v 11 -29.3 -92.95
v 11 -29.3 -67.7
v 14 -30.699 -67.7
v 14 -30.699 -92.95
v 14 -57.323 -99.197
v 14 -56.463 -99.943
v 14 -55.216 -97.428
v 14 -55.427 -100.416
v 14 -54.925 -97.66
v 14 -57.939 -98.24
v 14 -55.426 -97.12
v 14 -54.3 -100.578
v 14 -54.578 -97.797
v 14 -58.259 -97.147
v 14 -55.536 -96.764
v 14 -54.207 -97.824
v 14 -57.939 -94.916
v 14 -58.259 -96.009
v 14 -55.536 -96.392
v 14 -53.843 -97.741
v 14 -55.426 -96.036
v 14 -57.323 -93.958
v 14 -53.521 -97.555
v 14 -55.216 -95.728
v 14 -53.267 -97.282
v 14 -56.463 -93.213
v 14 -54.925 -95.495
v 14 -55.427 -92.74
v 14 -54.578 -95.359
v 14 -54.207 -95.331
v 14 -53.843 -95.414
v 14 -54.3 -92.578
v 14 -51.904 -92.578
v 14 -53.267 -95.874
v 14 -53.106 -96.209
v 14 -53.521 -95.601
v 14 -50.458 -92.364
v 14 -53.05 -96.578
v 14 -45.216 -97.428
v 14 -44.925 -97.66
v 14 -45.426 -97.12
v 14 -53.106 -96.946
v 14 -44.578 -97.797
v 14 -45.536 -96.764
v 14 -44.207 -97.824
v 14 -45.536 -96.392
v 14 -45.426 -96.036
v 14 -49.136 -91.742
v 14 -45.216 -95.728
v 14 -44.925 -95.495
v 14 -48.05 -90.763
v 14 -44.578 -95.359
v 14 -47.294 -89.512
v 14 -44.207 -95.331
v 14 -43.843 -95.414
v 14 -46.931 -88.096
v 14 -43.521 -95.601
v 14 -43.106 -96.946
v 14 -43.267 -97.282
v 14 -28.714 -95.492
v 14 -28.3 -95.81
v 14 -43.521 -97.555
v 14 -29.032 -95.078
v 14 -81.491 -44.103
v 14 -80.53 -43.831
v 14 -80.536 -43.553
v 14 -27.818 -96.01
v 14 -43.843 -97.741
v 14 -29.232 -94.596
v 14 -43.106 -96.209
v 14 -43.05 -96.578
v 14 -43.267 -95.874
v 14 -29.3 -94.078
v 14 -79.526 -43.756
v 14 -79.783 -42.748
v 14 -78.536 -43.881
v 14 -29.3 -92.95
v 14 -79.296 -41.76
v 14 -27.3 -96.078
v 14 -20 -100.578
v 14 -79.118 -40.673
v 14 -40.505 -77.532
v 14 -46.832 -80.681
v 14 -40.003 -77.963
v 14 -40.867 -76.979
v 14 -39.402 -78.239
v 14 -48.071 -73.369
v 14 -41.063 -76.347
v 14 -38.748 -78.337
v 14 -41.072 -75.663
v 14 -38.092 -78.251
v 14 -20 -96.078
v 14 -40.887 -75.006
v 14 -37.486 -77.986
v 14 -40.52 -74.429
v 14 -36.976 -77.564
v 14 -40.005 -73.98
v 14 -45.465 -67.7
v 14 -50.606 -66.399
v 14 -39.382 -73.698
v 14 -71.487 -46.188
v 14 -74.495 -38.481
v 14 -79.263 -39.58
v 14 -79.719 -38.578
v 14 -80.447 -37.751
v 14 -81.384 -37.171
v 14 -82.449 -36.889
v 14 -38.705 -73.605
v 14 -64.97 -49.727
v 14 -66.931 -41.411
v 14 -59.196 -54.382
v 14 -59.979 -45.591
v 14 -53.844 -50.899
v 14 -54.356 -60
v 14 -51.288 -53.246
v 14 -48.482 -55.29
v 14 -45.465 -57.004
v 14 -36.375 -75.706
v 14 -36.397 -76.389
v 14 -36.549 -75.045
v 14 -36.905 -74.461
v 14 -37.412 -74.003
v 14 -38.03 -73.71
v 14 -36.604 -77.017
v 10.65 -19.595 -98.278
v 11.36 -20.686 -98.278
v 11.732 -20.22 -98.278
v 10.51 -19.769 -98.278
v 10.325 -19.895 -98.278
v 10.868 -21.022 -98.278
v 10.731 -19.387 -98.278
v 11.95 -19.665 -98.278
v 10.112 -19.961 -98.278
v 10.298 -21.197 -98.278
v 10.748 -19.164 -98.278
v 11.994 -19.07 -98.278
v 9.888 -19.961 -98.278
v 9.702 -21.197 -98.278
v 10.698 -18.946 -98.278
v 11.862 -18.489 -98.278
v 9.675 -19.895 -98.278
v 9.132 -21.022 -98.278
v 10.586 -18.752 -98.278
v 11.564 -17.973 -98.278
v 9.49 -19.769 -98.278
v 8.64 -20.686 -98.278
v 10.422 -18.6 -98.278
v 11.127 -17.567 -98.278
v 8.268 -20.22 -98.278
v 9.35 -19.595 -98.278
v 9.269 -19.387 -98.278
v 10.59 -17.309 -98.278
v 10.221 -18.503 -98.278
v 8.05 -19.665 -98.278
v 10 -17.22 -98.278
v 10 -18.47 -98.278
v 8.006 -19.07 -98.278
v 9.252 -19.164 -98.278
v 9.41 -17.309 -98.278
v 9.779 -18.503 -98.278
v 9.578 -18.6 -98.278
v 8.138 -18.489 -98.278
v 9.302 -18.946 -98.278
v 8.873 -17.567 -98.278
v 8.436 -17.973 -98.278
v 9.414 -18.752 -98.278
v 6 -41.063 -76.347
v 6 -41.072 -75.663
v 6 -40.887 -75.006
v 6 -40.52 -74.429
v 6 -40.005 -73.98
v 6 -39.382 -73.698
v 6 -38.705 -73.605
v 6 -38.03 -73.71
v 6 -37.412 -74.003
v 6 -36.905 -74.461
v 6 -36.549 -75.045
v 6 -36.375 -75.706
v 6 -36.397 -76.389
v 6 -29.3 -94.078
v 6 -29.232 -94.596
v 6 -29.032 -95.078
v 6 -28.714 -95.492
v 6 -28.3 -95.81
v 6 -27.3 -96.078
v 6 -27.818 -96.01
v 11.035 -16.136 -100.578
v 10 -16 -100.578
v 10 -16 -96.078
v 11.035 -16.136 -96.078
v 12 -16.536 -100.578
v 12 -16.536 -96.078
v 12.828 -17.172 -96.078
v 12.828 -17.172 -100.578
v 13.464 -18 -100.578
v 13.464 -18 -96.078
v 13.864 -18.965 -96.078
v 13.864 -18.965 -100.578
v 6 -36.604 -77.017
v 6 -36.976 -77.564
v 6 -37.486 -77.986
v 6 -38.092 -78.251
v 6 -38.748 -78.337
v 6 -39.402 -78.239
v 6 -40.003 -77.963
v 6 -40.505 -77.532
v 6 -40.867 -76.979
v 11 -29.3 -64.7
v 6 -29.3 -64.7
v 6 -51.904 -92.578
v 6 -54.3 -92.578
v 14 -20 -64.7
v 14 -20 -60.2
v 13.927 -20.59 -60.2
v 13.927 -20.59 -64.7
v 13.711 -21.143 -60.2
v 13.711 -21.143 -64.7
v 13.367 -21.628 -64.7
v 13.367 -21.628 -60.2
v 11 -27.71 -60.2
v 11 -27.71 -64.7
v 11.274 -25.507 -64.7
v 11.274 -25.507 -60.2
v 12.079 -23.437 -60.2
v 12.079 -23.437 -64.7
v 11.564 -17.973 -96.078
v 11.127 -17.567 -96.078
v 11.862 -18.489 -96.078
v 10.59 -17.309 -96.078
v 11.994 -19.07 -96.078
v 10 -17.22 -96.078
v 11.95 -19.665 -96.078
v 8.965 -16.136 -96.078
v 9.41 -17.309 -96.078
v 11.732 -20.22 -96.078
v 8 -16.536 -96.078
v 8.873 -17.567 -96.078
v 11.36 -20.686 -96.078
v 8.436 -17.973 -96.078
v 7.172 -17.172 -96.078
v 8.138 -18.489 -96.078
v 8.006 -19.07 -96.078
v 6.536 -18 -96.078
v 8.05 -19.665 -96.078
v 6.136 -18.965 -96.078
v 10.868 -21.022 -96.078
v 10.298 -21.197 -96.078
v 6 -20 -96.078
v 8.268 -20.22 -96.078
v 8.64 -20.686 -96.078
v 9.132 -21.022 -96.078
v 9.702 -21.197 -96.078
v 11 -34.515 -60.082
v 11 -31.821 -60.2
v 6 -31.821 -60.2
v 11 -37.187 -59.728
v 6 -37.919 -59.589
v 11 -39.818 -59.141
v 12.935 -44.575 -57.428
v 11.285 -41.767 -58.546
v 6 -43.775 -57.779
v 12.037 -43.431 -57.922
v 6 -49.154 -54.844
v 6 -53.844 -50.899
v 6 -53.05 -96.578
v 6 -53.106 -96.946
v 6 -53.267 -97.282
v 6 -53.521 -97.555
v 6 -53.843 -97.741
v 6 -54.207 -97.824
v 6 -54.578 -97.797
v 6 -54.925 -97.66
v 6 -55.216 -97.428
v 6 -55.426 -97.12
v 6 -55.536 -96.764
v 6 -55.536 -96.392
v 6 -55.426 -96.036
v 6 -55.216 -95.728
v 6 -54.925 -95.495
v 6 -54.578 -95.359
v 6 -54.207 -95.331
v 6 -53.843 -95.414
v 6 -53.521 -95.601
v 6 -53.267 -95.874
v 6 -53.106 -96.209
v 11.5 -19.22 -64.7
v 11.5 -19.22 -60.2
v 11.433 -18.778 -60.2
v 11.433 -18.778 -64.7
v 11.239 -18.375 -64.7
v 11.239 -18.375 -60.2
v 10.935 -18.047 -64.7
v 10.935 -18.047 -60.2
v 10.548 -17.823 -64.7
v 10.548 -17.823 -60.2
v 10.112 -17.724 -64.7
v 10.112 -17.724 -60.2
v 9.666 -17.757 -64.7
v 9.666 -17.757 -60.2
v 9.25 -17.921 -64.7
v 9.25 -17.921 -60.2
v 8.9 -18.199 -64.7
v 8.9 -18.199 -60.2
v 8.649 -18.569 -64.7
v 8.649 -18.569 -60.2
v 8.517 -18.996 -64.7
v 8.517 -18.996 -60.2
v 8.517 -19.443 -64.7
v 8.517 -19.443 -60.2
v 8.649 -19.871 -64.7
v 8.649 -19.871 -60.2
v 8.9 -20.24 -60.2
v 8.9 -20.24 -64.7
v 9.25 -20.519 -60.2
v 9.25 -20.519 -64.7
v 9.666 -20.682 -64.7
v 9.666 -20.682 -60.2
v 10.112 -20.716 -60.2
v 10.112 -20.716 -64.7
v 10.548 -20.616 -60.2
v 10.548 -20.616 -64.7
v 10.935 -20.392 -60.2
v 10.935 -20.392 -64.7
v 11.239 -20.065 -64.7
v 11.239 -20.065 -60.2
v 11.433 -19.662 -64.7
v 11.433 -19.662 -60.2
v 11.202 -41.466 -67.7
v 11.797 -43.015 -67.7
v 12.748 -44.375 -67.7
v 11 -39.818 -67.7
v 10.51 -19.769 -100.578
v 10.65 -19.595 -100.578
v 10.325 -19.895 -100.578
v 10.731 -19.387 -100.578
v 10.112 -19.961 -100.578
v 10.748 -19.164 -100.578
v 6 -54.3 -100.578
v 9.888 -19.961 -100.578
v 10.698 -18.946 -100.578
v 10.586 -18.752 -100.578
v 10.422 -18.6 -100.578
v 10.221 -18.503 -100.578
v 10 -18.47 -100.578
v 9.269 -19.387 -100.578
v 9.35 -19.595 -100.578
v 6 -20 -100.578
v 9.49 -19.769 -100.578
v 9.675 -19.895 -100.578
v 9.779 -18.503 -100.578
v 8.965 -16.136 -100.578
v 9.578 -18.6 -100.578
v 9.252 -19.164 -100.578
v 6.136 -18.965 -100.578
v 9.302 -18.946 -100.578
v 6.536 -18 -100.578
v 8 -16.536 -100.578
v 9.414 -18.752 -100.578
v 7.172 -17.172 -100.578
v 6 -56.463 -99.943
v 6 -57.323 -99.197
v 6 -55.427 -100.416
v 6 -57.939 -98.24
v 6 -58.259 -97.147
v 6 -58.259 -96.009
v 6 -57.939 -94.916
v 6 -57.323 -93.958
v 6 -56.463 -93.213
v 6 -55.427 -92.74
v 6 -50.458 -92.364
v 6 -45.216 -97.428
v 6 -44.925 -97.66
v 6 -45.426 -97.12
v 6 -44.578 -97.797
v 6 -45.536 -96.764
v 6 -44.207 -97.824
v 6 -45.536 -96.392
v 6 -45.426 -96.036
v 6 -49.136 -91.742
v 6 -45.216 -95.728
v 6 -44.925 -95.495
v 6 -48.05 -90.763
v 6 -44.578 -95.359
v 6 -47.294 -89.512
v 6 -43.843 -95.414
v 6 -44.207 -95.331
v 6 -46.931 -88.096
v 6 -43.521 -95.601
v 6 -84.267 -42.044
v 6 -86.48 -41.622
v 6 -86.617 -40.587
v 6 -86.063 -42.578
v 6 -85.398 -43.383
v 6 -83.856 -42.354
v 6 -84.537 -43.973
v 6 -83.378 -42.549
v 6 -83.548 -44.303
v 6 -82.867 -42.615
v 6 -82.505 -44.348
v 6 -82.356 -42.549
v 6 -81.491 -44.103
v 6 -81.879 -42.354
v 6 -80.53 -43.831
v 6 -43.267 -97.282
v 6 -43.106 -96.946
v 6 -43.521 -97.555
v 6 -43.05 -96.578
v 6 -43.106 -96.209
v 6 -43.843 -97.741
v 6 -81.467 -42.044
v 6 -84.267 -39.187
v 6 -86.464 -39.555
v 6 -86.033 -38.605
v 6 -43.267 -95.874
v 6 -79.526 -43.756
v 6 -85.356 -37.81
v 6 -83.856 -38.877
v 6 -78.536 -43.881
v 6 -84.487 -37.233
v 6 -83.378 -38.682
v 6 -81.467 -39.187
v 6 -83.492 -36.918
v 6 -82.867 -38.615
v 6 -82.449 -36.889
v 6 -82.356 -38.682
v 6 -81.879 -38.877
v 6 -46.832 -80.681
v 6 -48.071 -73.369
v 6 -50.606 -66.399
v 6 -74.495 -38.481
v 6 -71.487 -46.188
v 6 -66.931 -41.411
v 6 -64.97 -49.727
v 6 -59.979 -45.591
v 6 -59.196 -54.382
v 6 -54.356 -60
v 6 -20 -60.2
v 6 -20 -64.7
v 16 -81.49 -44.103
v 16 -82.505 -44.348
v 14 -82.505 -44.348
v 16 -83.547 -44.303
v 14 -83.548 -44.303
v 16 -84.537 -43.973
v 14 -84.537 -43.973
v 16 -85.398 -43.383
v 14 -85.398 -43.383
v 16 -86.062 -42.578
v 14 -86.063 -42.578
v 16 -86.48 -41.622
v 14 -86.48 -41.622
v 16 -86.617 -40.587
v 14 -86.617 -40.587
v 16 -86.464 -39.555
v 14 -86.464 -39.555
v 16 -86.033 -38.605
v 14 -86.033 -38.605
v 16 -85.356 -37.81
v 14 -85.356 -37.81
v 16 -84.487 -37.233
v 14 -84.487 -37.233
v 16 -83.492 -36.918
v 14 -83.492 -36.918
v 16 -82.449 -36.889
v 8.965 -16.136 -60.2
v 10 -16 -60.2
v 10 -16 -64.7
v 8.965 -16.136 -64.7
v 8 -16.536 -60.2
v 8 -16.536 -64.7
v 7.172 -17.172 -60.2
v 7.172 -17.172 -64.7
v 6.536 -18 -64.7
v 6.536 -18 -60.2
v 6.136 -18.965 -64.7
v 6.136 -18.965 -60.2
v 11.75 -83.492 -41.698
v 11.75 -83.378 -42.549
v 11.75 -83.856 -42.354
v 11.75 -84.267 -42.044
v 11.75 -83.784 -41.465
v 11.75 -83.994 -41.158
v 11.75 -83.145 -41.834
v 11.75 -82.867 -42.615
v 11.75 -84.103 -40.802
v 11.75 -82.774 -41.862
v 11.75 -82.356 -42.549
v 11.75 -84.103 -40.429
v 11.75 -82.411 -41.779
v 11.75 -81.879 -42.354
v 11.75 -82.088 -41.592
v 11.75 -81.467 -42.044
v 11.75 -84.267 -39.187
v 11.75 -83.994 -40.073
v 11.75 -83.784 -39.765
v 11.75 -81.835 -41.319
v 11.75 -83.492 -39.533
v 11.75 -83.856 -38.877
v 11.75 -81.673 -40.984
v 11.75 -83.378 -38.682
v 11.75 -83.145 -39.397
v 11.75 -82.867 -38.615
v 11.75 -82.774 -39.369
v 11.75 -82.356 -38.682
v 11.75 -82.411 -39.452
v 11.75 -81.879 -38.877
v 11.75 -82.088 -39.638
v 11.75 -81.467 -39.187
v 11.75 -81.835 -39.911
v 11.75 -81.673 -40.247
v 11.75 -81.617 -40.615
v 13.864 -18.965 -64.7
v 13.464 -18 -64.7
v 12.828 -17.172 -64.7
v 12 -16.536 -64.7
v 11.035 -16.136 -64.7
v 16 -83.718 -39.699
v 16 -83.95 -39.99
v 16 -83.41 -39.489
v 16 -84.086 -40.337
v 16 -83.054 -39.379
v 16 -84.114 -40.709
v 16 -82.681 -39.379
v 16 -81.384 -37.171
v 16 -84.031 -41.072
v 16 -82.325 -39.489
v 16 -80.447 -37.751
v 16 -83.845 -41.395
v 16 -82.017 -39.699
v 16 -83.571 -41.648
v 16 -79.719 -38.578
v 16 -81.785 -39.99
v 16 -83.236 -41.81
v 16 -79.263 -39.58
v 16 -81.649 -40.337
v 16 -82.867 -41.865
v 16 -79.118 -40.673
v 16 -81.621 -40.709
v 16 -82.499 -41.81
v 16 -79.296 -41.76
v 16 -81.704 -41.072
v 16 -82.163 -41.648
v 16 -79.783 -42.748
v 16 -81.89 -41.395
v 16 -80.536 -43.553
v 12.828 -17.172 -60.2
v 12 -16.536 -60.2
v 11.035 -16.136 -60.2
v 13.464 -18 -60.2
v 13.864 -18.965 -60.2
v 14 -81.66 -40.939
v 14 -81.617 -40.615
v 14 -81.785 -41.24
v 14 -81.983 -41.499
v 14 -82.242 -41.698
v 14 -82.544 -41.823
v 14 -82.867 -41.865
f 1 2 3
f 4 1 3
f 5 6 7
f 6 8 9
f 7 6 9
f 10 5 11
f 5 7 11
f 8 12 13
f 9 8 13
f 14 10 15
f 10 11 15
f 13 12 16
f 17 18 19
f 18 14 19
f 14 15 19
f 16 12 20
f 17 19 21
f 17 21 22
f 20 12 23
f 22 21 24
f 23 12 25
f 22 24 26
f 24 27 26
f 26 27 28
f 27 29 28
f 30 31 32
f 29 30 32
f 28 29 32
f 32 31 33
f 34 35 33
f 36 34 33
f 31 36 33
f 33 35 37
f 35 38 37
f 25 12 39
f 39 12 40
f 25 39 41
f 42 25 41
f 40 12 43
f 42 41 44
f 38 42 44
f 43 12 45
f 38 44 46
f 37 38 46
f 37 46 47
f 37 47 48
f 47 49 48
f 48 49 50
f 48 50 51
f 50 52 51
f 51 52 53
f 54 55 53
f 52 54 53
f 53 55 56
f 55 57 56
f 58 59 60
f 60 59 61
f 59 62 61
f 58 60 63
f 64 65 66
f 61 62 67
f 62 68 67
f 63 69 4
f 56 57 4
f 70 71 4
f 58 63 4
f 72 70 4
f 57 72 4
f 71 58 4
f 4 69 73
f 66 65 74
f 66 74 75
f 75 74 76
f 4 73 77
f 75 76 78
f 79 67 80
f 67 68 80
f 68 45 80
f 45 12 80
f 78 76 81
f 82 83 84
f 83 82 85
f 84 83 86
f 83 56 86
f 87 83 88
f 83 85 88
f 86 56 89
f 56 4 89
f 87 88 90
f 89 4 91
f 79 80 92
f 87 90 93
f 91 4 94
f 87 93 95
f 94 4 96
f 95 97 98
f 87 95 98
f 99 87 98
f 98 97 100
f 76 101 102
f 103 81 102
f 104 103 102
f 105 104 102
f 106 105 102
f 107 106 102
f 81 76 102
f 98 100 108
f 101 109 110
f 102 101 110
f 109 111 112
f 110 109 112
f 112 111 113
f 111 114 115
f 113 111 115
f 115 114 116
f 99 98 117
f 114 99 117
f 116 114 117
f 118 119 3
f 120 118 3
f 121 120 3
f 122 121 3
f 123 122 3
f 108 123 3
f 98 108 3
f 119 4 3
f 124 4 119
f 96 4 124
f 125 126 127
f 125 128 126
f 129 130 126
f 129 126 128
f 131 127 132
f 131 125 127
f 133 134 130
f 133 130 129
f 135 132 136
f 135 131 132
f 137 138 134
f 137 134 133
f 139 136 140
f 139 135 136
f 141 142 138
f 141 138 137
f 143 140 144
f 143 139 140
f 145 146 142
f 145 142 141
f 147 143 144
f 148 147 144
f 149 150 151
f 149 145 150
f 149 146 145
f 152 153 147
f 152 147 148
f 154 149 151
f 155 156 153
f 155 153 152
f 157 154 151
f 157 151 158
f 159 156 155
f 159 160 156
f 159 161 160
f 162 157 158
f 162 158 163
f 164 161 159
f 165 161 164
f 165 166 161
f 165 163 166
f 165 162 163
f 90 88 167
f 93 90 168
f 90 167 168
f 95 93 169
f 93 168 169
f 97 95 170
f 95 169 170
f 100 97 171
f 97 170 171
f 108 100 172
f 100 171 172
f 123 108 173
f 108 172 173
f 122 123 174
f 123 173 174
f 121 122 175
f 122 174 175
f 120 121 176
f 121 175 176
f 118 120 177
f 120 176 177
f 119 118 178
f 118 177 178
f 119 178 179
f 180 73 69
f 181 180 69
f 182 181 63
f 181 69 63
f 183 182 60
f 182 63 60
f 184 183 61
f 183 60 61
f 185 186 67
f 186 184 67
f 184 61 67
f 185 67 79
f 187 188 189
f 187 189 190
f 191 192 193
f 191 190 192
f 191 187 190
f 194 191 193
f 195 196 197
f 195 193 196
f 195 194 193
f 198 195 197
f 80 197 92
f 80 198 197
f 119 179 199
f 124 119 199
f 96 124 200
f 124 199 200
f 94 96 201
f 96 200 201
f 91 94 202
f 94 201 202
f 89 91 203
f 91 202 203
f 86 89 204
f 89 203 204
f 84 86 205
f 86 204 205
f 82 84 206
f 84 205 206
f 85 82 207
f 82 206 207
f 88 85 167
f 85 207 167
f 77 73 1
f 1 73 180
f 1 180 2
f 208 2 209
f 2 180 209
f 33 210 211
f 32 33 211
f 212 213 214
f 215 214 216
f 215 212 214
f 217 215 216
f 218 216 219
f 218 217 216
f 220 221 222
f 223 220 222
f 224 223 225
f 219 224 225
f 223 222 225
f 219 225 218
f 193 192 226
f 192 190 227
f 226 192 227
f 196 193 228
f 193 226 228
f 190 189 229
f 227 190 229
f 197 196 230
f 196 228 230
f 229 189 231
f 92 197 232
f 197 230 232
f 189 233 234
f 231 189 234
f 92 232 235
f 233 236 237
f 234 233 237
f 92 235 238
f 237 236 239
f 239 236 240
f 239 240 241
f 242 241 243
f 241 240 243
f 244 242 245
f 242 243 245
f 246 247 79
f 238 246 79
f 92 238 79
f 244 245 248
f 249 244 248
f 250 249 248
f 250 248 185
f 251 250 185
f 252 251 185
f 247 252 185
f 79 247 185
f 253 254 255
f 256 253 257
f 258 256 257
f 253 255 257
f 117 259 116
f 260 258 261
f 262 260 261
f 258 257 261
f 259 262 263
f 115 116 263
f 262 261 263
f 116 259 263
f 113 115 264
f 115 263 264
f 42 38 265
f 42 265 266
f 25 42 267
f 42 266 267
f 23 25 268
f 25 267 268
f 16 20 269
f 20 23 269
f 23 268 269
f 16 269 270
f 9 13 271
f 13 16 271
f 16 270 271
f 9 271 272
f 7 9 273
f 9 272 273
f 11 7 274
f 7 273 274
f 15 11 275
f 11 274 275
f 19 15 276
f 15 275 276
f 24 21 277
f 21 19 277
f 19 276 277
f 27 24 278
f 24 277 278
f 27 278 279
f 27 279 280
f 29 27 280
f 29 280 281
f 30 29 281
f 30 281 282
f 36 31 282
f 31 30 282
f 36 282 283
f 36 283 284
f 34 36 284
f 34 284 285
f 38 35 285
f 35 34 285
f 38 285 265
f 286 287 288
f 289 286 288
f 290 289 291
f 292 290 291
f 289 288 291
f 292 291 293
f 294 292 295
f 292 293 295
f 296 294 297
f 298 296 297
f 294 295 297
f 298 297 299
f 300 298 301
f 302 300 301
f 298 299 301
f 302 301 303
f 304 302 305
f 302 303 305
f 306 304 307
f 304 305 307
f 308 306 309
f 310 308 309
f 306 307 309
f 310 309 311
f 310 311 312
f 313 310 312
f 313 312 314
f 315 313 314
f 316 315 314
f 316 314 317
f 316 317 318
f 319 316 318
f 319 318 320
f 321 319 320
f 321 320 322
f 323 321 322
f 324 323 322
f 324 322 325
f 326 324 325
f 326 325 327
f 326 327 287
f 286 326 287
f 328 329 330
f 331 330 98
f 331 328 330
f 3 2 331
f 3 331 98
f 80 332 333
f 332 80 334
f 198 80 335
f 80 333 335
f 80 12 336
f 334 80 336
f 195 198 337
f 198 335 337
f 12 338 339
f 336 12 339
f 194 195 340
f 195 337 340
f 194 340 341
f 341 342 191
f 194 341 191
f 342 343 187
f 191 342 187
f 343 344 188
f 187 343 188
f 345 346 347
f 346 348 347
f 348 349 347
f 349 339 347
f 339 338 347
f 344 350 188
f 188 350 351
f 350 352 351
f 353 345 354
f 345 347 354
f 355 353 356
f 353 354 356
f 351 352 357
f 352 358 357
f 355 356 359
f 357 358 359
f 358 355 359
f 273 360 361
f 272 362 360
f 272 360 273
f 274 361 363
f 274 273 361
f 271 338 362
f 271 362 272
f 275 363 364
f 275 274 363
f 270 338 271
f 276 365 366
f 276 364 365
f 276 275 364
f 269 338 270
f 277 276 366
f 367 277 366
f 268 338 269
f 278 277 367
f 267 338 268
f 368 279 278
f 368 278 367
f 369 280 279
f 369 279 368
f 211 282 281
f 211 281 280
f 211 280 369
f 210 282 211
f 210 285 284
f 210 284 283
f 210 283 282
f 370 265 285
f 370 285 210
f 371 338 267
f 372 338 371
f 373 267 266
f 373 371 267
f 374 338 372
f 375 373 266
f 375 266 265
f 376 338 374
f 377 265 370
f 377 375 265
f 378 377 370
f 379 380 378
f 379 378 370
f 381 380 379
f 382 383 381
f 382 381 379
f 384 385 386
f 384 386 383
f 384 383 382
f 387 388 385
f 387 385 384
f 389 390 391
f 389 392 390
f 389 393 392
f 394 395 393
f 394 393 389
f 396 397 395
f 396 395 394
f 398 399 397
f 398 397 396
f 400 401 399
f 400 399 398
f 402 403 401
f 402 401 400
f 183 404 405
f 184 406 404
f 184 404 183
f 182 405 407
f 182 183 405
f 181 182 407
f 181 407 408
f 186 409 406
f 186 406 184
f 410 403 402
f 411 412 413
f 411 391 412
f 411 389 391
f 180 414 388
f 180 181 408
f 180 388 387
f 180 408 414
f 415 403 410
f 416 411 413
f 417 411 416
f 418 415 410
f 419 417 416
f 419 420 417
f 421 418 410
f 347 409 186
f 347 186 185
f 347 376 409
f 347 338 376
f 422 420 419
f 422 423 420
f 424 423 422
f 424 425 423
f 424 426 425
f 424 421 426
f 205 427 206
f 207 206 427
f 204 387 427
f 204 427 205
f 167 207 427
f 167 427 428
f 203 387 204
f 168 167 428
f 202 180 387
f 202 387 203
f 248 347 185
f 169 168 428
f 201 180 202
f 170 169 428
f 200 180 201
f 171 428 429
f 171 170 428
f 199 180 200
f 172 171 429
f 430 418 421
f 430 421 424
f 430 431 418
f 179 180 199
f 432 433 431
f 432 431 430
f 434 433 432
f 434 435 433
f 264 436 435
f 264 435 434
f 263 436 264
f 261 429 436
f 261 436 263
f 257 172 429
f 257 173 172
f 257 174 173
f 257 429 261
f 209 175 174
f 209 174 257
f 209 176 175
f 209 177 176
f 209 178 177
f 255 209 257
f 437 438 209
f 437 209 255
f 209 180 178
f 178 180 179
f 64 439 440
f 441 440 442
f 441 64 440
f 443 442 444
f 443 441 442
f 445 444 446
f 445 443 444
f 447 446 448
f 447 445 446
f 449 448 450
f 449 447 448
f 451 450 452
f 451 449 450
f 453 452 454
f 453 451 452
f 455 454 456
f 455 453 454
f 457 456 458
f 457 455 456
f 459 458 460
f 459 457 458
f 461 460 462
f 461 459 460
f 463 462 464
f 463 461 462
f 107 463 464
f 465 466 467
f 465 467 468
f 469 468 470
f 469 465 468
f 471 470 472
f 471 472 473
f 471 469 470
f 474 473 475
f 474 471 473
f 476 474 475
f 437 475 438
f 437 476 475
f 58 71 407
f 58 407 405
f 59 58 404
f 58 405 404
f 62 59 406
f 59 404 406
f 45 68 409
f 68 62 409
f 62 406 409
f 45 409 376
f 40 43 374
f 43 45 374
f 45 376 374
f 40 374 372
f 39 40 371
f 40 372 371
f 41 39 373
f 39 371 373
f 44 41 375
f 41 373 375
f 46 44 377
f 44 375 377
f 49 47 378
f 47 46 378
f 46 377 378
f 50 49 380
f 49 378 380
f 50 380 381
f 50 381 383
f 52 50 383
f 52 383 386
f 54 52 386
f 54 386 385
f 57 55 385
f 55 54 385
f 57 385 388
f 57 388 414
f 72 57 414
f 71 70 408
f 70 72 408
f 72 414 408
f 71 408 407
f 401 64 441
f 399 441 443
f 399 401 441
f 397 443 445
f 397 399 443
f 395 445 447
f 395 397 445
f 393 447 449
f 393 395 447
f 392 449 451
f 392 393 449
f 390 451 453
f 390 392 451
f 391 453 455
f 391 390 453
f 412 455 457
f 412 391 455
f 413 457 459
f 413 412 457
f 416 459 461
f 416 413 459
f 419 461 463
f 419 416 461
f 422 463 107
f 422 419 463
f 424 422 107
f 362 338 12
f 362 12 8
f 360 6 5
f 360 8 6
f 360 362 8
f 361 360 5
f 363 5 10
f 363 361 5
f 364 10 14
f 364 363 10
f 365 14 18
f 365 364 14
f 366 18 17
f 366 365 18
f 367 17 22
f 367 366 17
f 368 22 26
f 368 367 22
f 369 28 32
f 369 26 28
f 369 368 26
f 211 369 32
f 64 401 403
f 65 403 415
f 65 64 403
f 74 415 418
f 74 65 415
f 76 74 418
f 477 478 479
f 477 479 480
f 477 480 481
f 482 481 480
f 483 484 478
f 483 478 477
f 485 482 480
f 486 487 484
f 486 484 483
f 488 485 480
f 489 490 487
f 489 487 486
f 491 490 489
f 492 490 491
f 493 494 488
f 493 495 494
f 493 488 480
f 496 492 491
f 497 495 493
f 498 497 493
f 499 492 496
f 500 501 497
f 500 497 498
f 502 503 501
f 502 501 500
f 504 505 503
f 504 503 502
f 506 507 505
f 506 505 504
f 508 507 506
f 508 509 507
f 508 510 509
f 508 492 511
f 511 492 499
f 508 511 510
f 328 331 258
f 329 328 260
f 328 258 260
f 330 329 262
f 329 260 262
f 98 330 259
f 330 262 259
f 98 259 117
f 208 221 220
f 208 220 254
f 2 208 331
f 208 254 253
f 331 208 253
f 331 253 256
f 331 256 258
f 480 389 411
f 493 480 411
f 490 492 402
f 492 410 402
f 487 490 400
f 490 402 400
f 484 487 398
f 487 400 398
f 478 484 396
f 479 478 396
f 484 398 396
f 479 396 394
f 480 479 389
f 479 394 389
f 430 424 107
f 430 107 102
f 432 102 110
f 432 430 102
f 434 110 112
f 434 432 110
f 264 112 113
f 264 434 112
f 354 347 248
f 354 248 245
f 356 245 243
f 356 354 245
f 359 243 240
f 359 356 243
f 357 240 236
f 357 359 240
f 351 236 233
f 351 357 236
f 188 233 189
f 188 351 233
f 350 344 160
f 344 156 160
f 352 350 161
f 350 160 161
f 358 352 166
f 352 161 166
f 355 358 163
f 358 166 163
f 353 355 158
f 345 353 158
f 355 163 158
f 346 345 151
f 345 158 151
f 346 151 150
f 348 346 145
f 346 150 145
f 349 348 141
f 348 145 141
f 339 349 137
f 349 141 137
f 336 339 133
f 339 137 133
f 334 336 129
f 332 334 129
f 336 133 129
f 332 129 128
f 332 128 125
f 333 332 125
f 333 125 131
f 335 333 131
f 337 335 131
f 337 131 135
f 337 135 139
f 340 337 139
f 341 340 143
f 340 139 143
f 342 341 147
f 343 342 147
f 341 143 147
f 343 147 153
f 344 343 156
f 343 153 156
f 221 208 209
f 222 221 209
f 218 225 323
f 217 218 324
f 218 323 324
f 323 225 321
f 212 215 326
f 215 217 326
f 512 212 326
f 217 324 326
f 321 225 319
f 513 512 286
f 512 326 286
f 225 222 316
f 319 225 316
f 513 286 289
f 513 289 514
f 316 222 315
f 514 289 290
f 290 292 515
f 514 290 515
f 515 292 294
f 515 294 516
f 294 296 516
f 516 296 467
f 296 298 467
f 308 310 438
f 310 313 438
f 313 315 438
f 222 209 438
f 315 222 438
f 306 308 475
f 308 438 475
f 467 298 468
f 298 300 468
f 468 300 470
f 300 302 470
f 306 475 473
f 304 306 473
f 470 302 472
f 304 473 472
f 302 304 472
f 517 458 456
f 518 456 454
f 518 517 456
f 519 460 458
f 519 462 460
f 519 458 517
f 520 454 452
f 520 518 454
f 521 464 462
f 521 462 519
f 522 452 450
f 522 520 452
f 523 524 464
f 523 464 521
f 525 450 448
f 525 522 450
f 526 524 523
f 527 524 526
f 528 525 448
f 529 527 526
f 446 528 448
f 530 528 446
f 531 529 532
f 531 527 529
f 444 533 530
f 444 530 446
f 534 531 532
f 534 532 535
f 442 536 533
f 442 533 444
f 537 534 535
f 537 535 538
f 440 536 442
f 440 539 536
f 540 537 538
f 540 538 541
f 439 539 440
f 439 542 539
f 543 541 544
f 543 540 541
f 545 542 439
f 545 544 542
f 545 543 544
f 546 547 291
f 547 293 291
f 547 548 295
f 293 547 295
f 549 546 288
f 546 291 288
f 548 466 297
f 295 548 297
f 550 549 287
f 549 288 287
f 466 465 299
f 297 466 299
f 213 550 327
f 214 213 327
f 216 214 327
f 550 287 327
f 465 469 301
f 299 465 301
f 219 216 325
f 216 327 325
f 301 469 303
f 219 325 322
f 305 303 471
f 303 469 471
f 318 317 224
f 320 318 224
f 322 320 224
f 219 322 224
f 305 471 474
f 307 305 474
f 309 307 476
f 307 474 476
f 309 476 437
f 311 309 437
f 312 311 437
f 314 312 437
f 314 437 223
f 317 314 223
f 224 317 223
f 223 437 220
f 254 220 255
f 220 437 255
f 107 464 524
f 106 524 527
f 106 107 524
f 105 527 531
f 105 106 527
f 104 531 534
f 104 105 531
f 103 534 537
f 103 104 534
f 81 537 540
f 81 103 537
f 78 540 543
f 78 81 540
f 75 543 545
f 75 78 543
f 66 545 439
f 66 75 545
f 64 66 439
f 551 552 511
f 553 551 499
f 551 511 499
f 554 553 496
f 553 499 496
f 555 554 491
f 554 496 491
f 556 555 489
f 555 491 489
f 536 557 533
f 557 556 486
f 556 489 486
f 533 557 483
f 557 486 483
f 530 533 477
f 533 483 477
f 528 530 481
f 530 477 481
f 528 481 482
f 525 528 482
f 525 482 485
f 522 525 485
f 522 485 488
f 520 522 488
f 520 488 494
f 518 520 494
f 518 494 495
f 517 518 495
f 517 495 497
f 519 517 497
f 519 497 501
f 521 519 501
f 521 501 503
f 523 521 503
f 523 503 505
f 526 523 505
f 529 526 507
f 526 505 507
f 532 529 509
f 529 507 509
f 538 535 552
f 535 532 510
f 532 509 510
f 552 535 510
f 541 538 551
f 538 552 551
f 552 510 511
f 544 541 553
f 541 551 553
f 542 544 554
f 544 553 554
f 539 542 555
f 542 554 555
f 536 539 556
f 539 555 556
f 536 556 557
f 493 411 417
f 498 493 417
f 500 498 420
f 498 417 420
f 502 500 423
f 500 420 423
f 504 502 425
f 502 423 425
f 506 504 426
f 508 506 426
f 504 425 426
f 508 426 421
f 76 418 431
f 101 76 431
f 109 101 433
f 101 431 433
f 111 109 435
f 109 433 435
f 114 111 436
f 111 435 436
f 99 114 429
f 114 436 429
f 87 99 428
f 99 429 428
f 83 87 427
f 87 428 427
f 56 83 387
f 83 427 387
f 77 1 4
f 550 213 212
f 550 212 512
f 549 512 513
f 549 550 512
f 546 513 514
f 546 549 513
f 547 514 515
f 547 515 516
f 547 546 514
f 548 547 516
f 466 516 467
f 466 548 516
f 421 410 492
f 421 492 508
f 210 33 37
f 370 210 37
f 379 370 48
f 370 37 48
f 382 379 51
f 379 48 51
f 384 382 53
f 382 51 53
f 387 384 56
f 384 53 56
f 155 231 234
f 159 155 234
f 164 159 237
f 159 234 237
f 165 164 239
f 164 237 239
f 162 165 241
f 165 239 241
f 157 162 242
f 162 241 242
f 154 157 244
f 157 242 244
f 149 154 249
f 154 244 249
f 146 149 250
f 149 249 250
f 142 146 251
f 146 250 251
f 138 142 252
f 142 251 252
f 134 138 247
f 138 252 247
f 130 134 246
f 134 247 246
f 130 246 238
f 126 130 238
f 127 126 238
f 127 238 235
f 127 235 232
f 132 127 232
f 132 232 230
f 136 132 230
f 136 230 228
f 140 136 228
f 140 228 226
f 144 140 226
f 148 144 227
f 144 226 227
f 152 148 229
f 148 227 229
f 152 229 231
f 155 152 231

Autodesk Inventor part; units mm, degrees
ref_plane "YZ Plane" through (0, 0, 0) normal (1, 0, 0) x (0, 1, 0)
ref_plane "XZ Plane" through (0, 0, 0) normal (0, 1, 0) x (-1, 0, 0)
ref_plane "plane_main" through (10, -20, 0) normal (1, 0, 0) x (0, 1, 0)
sketch "Sketch1" plane through (10, -20, 0) normal (1, 0, 0) x (0, 1, 0)
  line L0 (0, -108) -> (0, 18)
  line L1 (20, -86.5) -> (15.45, -86.5) projected
  line L2 (-1.875, -97.5779) -> (1.875, -97.5779) projected
  line L3 (-2.5, -65.2) -> (2.5, -65.2) projected
  line L4 (4, -96.0779) -> (-9.3, -96.0779)
  line L5 (-9.3, -96.0779) -> (-9.3, -64.7)
  line L6 (-9.3, -64.7) -> (4, -64.7)
  line L7 (4, -64.7) -> (4, -60.2)
  line L8 (4, -60.2) -> (-13.4946, -60.2)
  line L9 (-13.4946, -60.2) -> (-19.3, -92.5779)
  line L10 (-19.3, -92.5779) -> (-34.3, -92.5779)
  line L11 (-34.3, -92.5779) -> (-34.3, -100.5779) construction
  line L12 (-34.3, -100.5779) -> (4, -100.5779)
  line L13 (4, -96.0779) -> (4, -100.5779)
  line L14 (-7.3, -86.5) -> (-7.3, -65.2) projected
  arc A0 (-34.3, -92.5779) -> (-34.3, -100.5779) centre (-34.3, -96.5779) ccw
  circle A1 centre (-34.3, -96.5779) radius 1.25
  circle A2 centre (-24.3, -96.5779) radius 1.25
  line L15 (-34.3, -96.5779) -> (-24.3, -96.5779) construction
  point P0 (20, 0)
  dimension "d0" = 0.5
  dimension "d1" = 1.5
  dimension "d2" = 4.5
  dimension "d3" = 4.5
  dimension "d4" = 8
  dimension "d7" = 31.3779
  dimension "d8" = 2.5
  dimension "d9" = 10
  dimension "d10" = 15
  dimension "d11" = 10
  dimension "d12" = 2
  dimension "d21" = 4
  dimension "d22" = 4
extrude "ext_main" add sketch "Sketch1" along normal mid plane 8 contours L12 A0 L10 L9 L8 L0 L6 L5 L4 | L0 L4 L13 L12 | L0 L8 L7 L6
fillet "Fillet1" radius 2 3 edges at (10, -39.3, -92.5779) (10, -33.4946, -60.2) (10, -29.3, -96.0779)
sketch "Sketch3" plane through (6, -16, -60.2) normal (0, 0, 1) x (1, 0, 0)
  circle A0 centre (4, -3.2197) radius 1.5
  point P0 (-6, 16)
  dimension "d17" = 3
extrude "ext_cut_topbore" cut sketch "Sketch3" against normal up to surface (4.5 mm away)
fillet "Fillet2" radius 4 4 edges at (14, -16, -62.45) (6, -16, -62.45) (14, -16, -98.3279) (6, -16, -98.3279)
ref_plane "Work Plane2" through (6, -31.8213, -60.2) normal (0, 0, 1) x (1, 0, 0)
sketch "Sketch5" plane through (6, -31.8213, -60.2) normal (0, 0, 1) x (1, 0, 0)
  line L0 (8, 11.8213) -> (8, 0) projected
  circle A0 centre (14, 4.111) radius 9
  circle A1 centre (4, 12.6016) radius 1.5 projected
  arc A2 (8, 11.8213) -> (0, 11.8213) centre (4, 11.8213) ccw projected
  arc A3 (7.3667, 10.1937) -> (8, 11.8213) centre (5.5918, 11.8213) ccw
  line L1 (8, 11.8213) -> (8, 10.8192)
  line L2 (5, 4.111) -> (5, -4.889)
  line L3 (5, -4.889) -> (14, -4.889)
  point P0 (-6, 31.8213)
  point P1 (4, 12.611)
  dimension "d27" = 18
  dimension "d28" = 8.5
  dimension "d29" = 10
extrude "ext_cut_motor_cutway" cut sketch "Sketch5" along normal mid plane 15 contours L0 A0 A3 | A0 | A0 L3 L2
fillet "Fillet4" [suppressed]
sketch "Sketch6" plane through (10, -20, 0) normal (1, 0, 0) x (0, 1, 0)
  line L0 (0, -96.0779) -> (0, -96.0779) projected
  line L1 (-7.3, -96.0779) -> (0, -96.0779) projected
  line L2 (0, -96.0779) -> (-7.3, -96.0779) projected
  line L3 (0, -100.5779) -> (0, -100.5779) projected
  line L4 (-34.3, -100.5779) -> (0, -100.5779) projected
  line L5 (0, -100.5779) -> (-34.3, -100.5779) projected
  line L6 (0.7803, -108) -> (0.7803, 18) construction
  line L7 (0.7803, -96.0779) -> (0.7803, -100.5779)
  line L8 (1.5303, -100.5779) -> (1.5303, -98.2779)
  line L9 (1.5303, -98.2779) -> (2.7803, -98.2779)
  line L10 (2.7803, -98.2779) -> (2.7803, -96.0779)
  line L11 (2.7803, -96.0779) -> (0.7803, -96.0779)
  line L12 (0, -96.0779) -> (-7.3, -96.0779) projected
  line L13 (0.7803, -100.5779) -> (1.5303, -100.5779)
  line L14 (-34.3, -100.5779) -> (0, -100.5779) projected
  point P0 (20, 0)
  dimension "d37" = 0.75
  dimension "d38" = 2
  dimension "d39" = 2.2
revolve "revolution_servohubfit" cut sketch "Sketch6" angle 360 about axis through (10, -19.2197, -108) along (0, 0, 1)
sketch "Sketch7" plane through (10, -20, 0) normal (1, 0, 0) x (0, 1, 0)
  line L0 (0, -100.5779) -> (0, -96.0779) projected
  line L1 (0, -100.5779) -> (-34.3, -100.5779) projected
  arc A0 (-34.3, -92.5779) -> (-34.3, -100.5779) centre (-34.3, -96.5779) ccw projected
  line L2 (-34.3, -92.5779) -> (-20.9733, -92.5779) projected
  arc A1 (-20.9733, -92.5779) -> (-19.0047, -90.9309) centre (-20.9733, -90.5779) ccw projected
  line L3 (-19.0047, -90.9309) -> (-13.7899, -61.847) projected
  arc A2 (-11.8213, -60.2) -> (-13.7899, -61.847) centre (-11.8213, -62.2) ccw projected
  line L4 (-11.8213, -60.2) -> (0, -60.2) projected
  line L5 (0, -64.7) -> (0, -60.2) projected
  line L6 (0, -64.7) -> (-9.3, -64.7) projected
  line L7 (-9.3, -64.7) -> (-9.3, -94.0779) projected
  arc A3 (-9.3, -94.0779) -> (-7.3, -96.0779) centre (-7.3, -94.0779) ccw projected
  line L8 (-7.3, -96.0779) -> (0, -96.0779) projected
  circle A4 centre (-34.3, -96.5779) radius 1.25 projected
  circle A5 centre (-24.3, -96.5779) radius 1.25 projected
  line L9 (-34.3, -96.5779) -> (-24.3, -96.5779)
  line L10 (-24.3, -96.5779) -> (-24.3, -86.5779)
  line L11 (-24.3, -86.5779) -> (-62.8673, -40.6152) construction
  line L12 (-24.3, -86.5779) -> (-34.3, -96.5779) construction
  circle A6 centre (-62.8673, -40.6152) radius 1.25
  arc A7 (-24.3, -86.5779) -> (-62.8673, -40.6152) centre (-67.714, -83.8444) ccw construction
  line L13 (-34.3911, -55.8831) -> (-43.5836, -63.5965) construction
  circle A8 centre (-62.8673, -40.6152) radius 3.75
  line L14 (-19.0047, -90.9309) -> (-13.7899, -61.847) projected
  arc A9 (-24.3, -86.5779) -> (-59.1621, -41.1933) centre (-67.714, -83.8444) ccw
  arc A10 (-27.6511, -92.5779) -> (-60.4568, -43.4879) centre (-67.714, -83.8444) ccw
  line L15 (-19.2993, -92.5738) -> (-19.2993, -100.5779)
  line L16 (-24.3, -92.5779) -> (-24.3, -95.3279)
  line L17 (-19.2993, -95.3279) -> (-24.3, -95.3279)
  arc A11 (-21.0627, -76.3468) -> (-16.3973, -76.3889) centre (-18.7264, -75.9713) ccw
  line L18 (-14.8394, -67.7) -> (-19.0047, -90.9309) projected
  arc A12 (-62.0154, -36.9632) -> (-62.0154, -36.9632) centre (-74.2254, -89.308) ccw
  arc A13 (-21.2777, -92.5754) -> (-62.4494, -36.8886) centre (-67.714, -83.8444) ccw
  point P0 (20, 0)
  point P1 (-15.2647, -70.072)
  dimension "d41" = 60
  dimension "d43" = 10
  dimension "d44" = 140
  dimension "d45" = 2.5
  dimension "d46" = 12
  dimension "d53" = 2.5
extrude "Extrusion7" add sketch "Sketch7" along normal mid plane 8 contours A13 A12 | A12 A8 A13 | A12 A1 L2 L10 A9 A8 | A8 | A11 L3 A1 A12 A13 | A10 A8 A9 L10 L2
fillet "Fillet7" radius 5 2 edges at (10, -80.4568, -43.4879) (10, -47.6511, -92.5779)
sketch "Sketch11" plane through (6, -20, 0) normal (-1, 0, 0) x (0, 0, 1)
  circle A0 centre (-40.6152, -62.8673) radius 1.25 projected
  arc A1 (-44.1033, -61.4905) -> (-36.8886, -62.4494) centre (-40.6152, -62.8673) ccw projected
  line L0 (-96.0779, -7.3) -> (-96.0779, 0) projected
  circle A2 centre (-40.6152, -62.8673) radius 2
  line L1 (-42.6152, -62.8673) -> (-38.6152, -62.8673) construction
  line L2 (-120.6935, 20) -> (20.1156, 20) projected
  line L3 (-42.0435, -61.4673) -> (-39.1869, -61.4673)
  line L4 (-42.0435, -64.2673) -> (-39.1869, -64.2673)
  point P0 (0, 20)
  dimension "d68" = 4
  dimension "d69" = 2.8
extrude "Extrusion11" cut sketch "Sketch11" against normal blind 5.75 contours A0 | A2 L4 L3
sketch "Sketch12" plane through (14, -20, 0) normal (1, 0, 0) x (0, 0, -1)
  circle A0 centre (40.6152, -62.8673) radius 1.25 projected
  arc A1 (36.8886, -62.4494) -> (44.1033, -61.4905) centre (40.6152, -62.8673) ccw projected
  circle A2 centre (40.6152, -62.8673) radius 3.75
  point P0 (0, 20)
extrude "Extrusion12" add sketch "Sketch12" along normal blind 2
sketch "Sketch15" plane through (6, -20, 0) normal (-1, 0, 0) x (0, 0, 1)
  arc A0 (-36.8886, -62.4494) -> (-76.3468, -21.0627) centre (-83.8444, -67.714) ccw projected
  arc A1 (-76.3889, -16.3973) -> (-76.3468, -21.0627) centre (-75.9713, -18.7264) ccw projected
  line L0 (-76.3889, -16.3973) -> (-61.847, -13.7899) projected
  arc A2 (-61.847, -13.7899) -> (-60.2, -11.8213) centre (-62.2, -11.8213) ccw projected
  line L1 (-60.2, -11.8213) -> (-60.2, 0) projected
  arc A3 (-60.2, -11.8213) -> (-50.8988, -33.8444) centre (-29.4767, -11.8213) ccw
  circle A4 centre (-75.9713, -18.7264) radius 2.3662
  line L2 (-76.3889, -16.3973) -> (-61.847, -13.7899)
  arc A5 (-61.847, -13.7899) -> (-60.2, -11.8213) centre (-62.2, -11.8213) ccw
  arc A6 (-50.8988, -33.8444) -> (-76.3468, -21.0627) centre (-83.8444, -67.714) ccw
  point P0 (0, 20)
extrude "Extrusion14" add sketch "Sketch15" against normal blind 8 contours A0 A4 L0 A2 A3
sketch "Sketch16" plane through (6, -31.8213, -60.2) normal (0, 0, 1) x (1, 0, 0)
  line L0 (8, -3.018) -> (5, -3.018) projected
  line L1 (8, 2.5213) -> (8, -3.018) projected
  line L2 (5, 2.5213) -> (8, 2.5213) projected
  line L3 (5, -3.018) -> (5, 2.5213) projected
  line L4 (8, 0) -> (8, -22.023) projected
  line L5 (5, -3.018) -> (5, -7.9972)
  arc A0 (5, -7.9972) -> (8, -13.6434) centre (11.8132, -7.9972) ccw
  line L6 (8, -13.6434) -> (8, -3.018)
  line L7 (8, -3.018) -> (5, -3.018)
  point P0 (-6, 31.8213)
extrude "Extrusion15" cut sketch "Sketch16" against normal blind 7.5 and the other way blind 4
sketch "Sketch17" plane through (6, -31.8213, -67.7) normal (0, 0, 1) x (1, 0, 0)
  line L0 (8, 2.5213) -> (8, -13.6434) projected
  line L1 (5, 2.5213) -> (8, 2.5213) projected
  line L2 (5, 2.5213) -> (8, 1.1224)
  line L3 (8, 1.1224) -> (8, 2.5213)
  line L4 (8, 2.5213) -> (5, 2.5213)
  point P0 (-6, 31.8213)
  dimension "d85" = 25
extrude "Extrusion16" cut sketch "Sketch17" against normal blind 25.25
equation "\"d8\" = screw_m2_bore_loose"
equation "\"d21\" = 0.5 * model_main_thickness"
equation "\"d22\" = 0.5 * model_main_thickness"
equation "\"d5\" = model_main_thickness"
equation "\"d17\" = screw_m3_bore_selfthreading"
equation "\"d20\" = 0.5 * model_main_thickness"
equation "\"d36\" = 0.5 * model_main_thickness"
equation "\"d37\" = 0.5 * model_servoscrew_diam"
equation "\"d38\" = 0.5 * model_servohub_diam"
equation "\"d45\" = screw_m2_bore_loose"
equation "\"d54\" = model_main_thickness"
equation "\"d76\" = model_main_thickness"
equation "\"model_main_thickness\" = 8"
equation "\"model_servoscrew_diam\" = 1.5"
equation "\"model_servohub_diam\" = 4"
equation "\"screw_m2_bore_loose\" = 2.5"
equation "\"screw_m3_bore_selfthreading\" = 3"
properties part number "thumb_base"
